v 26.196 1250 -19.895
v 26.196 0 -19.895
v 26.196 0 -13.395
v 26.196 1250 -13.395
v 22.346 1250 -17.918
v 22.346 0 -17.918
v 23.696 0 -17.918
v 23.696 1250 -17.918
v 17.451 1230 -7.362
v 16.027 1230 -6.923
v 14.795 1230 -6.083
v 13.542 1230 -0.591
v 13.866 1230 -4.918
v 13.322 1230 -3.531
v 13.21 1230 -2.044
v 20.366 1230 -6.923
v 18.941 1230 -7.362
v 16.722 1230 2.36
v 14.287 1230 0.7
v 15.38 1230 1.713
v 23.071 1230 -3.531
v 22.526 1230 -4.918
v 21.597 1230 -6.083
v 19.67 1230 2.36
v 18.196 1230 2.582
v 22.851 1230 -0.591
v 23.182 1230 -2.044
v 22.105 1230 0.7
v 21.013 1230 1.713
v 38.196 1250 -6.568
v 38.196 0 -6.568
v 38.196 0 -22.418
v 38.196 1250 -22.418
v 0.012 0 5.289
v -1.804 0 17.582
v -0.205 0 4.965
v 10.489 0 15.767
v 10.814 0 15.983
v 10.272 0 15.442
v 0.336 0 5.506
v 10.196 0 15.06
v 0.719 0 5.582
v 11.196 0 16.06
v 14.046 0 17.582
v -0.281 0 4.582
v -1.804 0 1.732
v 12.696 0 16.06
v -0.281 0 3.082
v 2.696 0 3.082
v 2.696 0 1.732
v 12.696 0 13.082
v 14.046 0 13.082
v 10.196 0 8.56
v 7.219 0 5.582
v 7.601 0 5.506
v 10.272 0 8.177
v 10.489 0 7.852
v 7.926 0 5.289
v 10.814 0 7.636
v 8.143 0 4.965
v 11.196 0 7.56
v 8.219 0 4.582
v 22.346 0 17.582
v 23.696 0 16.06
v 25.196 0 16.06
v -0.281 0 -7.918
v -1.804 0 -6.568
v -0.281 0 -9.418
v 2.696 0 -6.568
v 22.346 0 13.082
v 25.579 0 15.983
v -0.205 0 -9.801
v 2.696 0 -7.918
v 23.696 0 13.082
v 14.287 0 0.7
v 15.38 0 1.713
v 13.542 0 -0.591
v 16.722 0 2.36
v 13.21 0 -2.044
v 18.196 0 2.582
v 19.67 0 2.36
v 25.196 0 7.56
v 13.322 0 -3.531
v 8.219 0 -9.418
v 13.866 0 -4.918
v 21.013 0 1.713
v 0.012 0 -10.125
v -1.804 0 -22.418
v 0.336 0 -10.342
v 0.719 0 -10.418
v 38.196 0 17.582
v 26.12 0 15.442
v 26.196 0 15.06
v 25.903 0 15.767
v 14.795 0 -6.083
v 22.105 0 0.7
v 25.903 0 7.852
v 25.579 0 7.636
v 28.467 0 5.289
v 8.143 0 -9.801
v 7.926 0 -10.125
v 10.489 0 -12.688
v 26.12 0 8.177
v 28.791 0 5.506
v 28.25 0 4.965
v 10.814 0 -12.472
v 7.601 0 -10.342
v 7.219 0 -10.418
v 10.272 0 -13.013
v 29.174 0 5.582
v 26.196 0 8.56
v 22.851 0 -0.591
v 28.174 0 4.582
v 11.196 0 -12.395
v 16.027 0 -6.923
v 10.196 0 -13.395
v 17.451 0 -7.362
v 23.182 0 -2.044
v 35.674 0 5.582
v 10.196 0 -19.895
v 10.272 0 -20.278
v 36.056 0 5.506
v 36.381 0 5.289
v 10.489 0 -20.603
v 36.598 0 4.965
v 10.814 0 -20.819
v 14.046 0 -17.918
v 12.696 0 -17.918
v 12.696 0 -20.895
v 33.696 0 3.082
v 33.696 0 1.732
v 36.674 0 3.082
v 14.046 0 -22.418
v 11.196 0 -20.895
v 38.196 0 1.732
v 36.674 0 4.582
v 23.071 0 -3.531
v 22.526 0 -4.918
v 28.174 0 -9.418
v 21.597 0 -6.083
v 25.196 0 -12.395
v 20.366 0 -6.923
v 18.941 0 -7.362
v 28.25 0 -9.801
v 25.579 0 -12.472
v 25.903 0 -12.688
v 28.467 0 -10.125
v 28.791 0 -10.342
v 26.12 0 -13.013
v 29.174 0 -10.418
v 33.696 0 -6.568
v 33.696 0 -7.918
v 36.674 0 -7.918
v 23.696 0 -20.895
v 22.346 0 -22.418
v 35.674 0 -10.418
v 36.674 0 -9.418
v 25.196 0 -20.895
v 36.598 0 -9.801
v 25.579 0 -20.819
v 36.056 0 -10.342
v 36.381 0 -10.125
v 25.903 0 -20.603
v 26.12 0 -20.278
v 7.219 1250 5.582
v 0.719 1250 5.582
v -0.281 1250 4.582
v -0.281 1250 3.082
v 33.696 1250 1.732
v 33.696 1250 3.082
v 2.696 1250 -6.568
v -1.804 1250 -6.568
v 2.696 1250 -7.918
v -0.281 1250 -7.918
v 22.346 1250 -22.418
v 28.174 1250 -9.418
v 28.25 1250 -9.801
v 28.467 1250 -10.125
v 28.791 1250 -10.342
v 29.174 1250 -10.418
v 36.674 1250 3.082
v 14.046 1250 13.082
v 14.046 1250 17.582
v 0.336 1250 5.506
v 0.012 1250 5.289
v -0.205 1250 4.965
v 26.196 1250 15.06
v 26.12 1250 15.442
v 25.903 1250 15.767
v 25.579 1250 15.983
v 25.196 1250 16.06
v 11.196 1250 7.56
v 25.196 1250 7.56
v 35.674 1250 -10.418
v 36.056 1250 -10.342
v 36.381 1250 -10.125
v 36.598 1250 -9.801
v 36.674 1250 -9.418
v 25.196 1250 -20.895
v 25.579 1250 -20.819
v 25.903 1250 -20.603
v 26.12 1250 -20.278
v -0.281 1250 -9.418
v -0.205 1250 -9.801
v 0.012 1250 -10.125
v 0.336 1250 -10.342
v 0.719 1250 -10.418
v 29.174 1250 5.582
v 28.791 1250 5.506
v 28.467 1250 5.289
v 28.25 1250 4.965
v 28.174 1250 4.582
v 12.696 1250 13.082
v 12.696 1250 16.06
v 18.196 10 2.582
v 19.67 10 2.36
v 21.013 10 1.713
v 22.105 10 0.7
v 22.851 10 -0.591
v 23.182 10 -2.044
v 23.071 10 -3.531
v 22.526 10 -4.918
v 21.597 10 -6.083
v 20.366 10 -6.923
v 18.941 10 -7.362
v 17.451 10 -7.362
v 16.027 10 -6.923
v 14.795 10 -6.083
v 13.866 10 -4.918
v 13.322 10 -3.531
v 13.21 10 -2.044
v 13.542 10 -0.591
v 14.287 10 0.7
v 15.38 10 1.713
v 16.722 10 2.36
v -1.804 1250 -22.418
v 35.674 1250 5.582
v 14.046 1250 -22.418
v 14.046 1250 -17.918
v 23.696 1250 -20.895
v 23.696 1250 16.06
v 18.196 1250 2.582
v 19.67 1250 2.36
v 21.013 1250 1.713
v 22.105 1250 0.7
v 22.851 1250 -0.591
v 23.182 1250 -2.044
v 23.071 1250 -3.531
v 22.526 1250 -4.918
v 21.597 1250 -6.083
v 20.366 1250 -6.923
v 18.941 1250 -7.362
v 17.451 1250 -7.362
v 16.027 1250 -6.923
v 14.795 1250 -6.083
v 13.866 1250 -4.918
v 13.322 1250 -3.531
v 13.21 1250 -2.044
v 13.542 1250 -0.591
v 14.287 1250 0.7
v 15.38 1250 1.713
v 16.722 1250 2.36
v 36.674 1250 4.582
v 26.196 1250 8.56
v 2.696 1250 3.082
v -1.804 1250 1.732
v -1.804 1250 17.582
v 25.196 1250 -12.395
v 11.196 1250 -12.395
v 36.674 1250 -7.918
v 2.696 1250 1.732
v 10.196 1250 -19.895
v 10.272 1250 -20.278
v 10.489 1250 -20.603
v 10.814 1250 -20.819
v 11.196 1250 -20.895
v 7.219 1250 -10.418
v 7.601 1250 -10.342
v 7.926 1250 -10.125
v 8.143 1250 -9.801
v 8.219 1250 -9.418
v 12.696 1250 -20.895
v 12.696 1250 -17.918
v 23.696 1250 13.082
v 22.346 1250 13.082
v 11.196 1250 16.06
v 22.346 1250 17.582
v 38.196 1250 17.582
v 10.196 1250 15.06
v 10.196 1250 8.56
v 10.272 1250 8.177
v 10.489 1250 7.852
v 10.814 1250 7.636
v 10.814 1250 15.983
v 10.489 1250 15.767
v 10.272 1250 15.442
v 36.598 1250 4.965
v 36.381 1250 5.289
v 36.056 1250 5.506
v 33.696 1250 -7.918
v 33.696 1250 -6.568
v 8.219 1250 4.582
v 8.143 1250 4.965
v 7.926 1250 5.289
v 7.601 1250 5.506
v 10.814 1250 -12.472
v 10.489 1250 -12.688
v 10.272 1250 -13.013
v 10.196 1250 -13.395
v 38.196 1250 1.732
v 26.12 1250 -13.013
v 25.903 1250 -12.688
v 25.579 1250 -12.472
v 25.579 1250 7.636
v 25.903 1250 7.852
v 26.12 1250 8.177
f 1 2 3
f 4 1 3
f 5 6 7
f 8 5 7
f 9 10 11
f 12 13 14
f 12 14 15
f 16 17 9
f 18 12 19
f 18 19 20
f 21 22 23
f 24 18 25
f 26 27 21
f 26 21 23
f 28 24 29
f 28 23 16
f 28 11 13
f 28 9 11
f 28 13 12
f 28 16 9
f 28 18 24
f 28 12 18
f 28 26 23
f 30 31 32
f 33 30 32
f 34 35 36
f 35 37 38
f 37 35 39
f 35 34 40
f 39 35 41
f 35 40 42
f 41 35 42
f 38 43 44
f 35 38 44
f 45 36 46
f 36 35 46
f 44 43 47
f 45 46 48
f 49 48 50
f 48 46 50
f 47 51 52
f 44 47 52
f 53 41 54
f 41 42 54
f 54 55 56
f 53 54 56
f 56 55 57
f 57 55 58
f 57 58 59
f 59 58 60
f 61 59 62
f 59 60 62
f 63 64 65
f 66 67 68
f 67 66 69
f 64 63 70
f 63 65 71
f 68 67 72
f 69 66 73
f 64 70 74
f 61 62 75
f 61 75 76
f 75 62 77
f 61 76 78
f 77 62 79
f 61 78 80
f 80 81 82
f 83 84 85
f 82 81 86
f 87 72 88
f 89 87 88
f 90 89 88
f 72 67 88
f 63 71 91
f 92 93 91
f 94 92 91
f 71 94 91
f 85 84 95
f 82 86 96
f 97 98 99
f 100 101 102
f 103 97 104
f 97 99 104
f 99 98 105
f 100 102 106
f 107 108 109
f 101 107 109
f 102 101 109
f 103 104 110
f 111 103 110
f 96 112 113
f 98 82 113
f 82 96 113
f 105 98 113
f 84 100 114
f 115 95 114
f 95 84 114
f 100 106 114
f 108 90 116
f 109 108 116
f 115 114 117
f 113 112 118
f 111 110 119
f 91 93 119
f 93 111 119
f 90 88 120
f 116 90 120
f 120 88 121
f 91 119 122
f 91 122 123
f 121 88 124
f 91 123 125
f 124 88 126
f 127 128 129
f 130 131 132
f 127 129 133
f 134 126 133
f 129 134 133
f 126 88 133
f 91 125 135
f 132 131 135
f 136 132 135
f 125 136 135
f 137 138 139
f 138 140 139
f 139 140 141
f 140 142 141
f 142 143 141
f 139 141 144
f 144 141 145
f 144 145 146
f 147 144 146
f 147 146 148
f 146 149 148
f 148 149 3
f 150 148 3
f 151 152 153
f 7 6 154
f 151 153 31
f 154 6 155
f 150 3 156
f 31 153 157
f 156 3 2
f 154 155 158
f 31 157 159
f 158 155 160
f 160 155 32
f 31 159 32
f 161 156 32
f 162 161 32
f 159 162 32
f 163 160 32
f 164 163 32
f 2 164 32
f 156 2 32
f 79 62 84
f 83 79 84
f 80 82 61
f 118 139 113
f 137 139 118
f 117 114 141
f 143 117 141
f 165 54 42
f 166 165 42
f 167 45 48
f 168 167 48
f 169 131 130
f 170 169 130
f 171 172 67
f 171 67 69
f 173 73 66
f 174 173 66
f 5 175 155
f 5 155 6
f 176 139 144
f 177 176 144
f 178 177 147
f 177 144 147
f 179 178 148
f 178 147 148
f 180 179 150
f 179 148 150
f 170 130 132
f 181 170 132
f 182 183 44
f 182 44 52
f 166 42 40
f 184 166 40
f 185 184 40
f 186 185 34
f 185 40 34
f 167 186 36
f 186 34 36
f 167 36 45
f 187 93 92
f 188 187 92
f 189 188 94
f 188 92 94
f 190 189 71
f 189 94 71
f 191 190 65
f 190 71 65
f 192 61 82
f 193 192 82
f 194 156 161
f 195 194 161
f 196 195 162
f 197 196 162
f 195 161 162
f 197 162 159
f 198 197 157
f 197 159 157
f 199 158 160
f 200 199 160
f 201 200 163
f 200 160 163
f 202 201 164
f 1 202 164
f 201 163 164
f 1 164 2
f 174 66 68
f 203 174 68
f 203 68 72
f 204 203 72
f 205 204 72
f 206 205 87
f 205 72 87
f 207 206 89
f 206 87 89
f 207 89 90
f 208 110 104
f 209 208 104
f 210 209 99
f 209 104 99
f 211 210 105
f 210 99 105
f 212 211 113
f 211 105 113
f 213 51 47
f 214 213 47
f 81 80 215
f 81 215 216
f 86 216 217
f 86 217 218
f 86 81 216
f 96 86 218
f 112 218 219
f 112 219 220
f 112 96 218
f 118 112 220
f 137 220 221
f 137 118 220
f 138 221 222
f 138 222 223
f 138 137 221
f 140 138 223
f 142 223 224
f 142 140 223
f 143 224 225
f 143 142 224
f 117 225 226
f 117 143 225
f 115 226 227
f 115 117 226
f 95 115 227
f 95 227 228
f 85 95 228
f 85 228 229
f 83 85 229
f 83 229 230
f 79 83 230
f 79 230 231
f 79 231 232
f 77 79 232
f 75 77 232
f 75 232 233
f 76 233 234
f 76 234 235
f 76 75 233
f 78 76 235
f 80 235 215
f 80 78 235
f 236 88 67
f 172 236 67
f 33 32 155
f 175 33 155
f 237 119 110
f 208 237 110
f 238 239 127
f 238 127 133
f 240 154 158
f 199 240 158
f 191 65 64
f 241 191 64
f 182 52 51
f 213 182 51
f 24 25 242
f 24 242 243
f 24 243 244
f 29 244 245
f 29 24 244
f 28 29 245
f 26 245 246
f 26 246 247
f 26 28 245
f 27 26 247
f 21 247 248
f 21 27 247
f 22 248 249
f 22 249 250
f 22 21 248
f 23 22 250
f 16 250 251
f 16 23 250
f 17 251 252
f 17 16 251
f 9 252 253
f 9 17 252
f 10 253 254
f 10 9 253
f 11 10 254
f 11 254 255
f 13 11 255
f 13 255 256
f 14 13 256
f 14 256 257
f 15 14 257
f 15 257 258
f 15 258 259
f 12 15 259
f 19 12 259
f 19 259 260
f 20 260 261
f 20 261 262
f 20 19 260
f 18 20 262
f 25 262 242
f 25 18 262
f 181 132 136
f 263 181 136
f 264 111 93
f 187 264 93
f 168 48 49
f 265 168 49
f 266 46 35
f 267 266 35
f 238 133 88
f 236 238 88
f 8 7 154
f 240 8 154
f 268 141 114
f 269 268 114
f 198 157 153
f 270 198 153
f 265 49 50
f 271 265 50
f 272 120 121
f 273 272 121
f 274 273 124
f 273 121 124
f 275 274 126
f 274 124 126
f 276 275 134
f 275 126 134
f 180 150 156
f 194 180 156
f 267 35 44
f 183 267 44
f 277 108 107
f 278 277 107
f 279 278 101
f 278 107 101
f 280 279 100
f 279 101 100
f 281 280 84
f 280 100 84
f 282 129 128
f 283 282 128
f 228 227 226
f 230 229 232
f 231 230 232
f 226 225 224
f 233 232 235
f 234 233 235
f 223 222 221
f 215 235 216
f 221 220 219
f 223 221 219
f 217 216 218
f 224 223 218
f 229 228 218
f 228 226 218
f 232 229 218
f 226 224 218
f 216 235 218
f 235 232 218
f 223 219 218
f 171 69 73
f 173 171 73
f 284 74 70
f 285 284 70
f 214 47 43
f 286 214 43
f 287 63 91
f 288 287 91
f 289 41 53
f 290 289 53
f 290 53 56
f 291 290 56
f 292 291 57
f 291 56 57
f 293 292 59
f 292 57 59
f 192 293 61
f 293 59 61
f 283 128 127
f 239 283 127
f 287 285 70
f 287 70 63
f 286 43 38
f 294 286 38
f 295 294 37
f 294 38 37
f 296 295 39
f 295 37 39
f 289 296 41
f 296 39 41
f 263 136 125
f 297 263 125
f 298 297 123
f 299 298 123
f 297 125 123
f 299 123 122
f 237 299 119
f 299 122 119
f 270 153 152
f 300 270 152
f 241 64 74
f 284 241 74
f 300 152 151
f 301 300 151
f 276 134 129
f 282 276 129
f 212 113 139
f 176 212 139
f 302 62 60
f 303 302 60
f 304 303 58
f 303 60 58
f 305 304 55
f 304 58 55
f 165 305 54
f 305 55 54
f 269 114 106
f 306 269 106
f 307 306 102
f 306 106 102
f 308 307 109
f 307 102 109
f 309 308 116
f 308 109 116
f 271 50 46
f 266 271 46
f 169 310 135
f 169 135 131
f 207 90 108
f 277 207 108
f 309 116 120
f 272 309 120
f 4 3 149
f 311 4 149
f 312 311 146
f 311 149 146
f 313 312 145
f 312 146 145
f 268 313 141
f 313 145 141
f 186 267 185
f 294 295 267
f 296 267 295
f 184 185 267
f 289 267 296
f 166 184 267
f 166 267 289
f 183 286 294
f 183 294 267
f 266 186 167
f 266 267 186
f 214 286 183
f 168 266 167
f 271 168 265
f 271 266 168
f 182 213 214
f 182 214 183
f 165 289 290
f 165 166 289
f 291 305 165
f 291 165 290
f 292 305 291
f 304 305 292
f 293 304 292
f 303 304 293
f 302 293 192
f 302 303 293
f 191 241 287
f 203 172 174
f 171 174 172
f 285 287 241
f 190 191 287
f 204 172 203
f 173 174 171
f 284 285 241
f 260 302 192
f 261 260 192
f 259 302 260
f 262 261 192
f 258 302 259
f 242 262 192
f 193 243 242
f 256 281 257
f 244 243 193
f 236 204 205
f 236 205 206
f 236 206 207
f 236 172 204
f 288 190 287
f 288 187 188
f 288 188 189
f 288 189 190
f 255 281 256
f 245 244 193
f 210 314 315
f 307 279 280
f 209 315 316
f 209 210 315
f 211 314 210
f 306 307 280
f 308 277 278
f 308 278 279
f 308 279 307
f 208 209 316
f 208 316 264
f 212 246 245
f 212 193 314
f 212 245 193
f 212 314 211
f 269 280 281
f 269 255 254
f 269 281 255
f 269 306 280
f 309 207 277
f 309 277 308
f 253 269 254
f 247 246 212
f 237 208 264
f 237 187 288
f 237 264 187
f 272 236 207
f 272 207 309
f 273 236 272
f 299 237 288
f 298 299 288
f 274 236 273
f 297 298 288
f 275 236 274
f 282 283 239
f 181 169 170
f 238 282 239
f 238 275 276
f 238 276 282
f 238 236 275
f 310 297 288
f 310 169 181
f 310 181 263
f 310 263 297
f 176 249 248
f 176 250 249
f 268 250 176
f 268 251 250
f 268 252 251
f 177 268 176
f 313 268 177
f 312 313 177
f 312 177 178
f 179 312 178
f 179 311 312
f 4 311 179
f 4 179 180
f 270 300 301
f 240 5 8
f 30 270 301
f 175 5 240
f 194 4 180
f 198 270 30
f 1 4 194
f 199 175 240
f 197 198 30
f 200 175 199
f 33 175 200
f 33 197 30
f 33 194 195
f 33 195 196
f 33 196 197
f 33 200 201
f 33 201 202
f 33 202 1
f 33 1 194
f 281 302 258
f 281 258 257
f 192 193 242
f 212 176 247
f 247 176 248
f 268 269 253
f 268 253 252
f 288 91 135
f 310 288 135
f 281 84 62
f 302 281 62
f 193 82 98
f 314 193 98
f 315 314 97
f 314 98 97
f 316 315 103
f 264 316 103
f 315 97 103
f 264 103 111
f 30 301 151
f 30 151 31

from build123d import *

# Parameters (mm, degrees)
RESSALTO_EXTRUS_O1_DEPTH = 1250
ESBO_O2_3_R              = 5
CORTE_EXTRUS_O1_DEPTH    = 10
CORTE_EXTRUS_O2_START    = -20
ESBO_O4_R                = 5
CORTE_EXTRUS_O2_DEPTH    = 20


with BuildPart() as part:
    # Esboço2 → Ressalto-extrusão1 (new body)
    with BuildSketch(Plane(origin=(0, 0, 0), x_dir=(1, 0, 0), z_dir=(0, 1, 0))):
        with BuildLine():
            Line((-1.803730261, 22.417940287), (-1.803730261, 6.567940287))
            Line((-1.803730261, 6.567940287), (2.696269739, 6.567940287))
            Line((2.696269739, 6.567940287), (2.696269739, 7.917940287))
            Line((2.696269739, 7.917940287), (-0.281184469, 7.917940287))
            Line((-0.281184469, 7.917940287), (-0.281184469, 9.417940287))
            ThreePointArc((-0.281184469, 9.417940287), (0.01170875, 10.125047068), (0.718815531, 10.417940287))
            Line((0.718815531, 10.417940287), (7.218815531, 10.417940287))
            ThreePointArc((7.218815531, 10.417940287), (7.925922312, 10.125047068), (8.218815531, 9.417940287))
            Line((8.218815531, 9.417940287), (8.218815531, -4.582059713))
            ThreePointArc((8.218815531, -4.582059713), (7.925922312, -5.289166494), (7.218815531, -5.582059713))
            Line((7.218815531, -5.582059713), (0.718815531, -5.582059713))
            ThreePointArc((0.718815531, -5.582059713), (0.01170875, -5.289166494), (-0.281184469, -4.582059713))
            Line((-0.281184469, -4.582059713), (-0.281184469, -3.082059713))
            Line((-0.281184469, -3.082059713), (2.696269739, -3.082059713))
            Line((2.696269739, -3.082059713), (2.696269739, -1.732059713))
            Line((2.696269739, -1.732059713), (-1.803730261, -1.732059713))
            Line((-1.803730261, -1.732059713), (-1.803730261, -17.582059713))
            Line((-1.803730261, -17.582059713), (14.046269739, -17.582059713))
            Line((14.046269739, -17.582059713), (14.046269739, -13.082059713))
            Line((14.046269739, -13.082059713), (12.696269739, -13.082059713))
            Line((12.696269739, -13.082059713), (12.696269739, -16.059513921))
            Line((12.696269739, -16.059513921), (11.196269739, -16.059513921))
            ThreePointArc((11.196269739, -16.059513921), (10.489162958, -15.766620702), (10.196269739, -15.059513921))
            Line((10.196269739, -15.059513921), (10.196269739, -8.559513921))
            ThreePointArc((10.196269739, -8.559513921), (10.489162958, -7.85240714), (11.196269739, -7.559513921))
            Line((11.196269739, -7.559513921), (25.196269739, -7.559513921))
            ThreePointArc((25.196269739, -7.559513921), (25.90337652, -7.85240714), (26.196269739, -8.559513921))
            Line((26.196269739, -8.559513921), (26.196269739, -15.059513921))
            ThreePointArc((26.196269739, -15.059513921), (25.90337652, -15.766620702), (25.196269739, -16.059513921))
            Line((25.196269739, -16.059513921), (23.696269739, -16.059513921))
            Line((23.696269739, -16.059513921), (23.696269739, -13.082059713))
            Line((23.696269739, -13.082059713), (22.346269739, -13.082059713))
            Line((22.346269739, -13.082059713), (22.346269739, -17.582059713))
            Line((22.346269739, -17.582059713), (38.196269739, -17.582059713))
            Line((38.196269739, -17.582059713), (38.196269739, -1.732059713))
            Line((38.196269739, -1.732059713), (33.696269739, -1.732059713))
            Line((33.696269739, -1.732059713), (33.696269739, -3.082059713))
            Line((33.696269739, -3.082059713), (36.673723947, -3.082059713))
            Line((36.673723947, -3.082059713), (36.673723947, -4.582059713))
            ThreePointArc((36.673723947, -4.582059713), (36.380830728, -5.289166494), (35.673723947, -5.582059713))
            Line((35.673723947, -5.582059713), (29.173723947, -5.582059713))
            ThreePointArc((29.173723947, -5.582059713), (28.466617166, -5.289166494), (28.173723947, -4.582059713))
            Line((28.173723947, -4.582059713), (28.173723947, 9.417940287))
            ThreePointArc((28.173723947, 9.417940287), (28.466617166, 10.125047068), (29.173723947, 10.417940287))
            Line((29.173723947, 10.417940287), (35.673723947, 10.417940287))
            ThreePointArc((35.673723947, 10.417940287), (36.380830728, 10.125047068), (36.673723947, 9.417940287))
            Line((36.673723947, 9.417940287), (36.673723947, 7.917940287))
            Line((36.673723947, 7.917940287), (33.696269739, 7.917940287))
            Line((33.696269739, 7.917940287), (33.696269739, 6.567940287))
            Line((33.696269739, 6.567940287), (38.196269739, 6.567940287))
            Line((38.196269739, 6.567940287), (38.196269739, 22.417940287))
            Line((38.196269739, 22.417940287), (22.346269739, 22.417940287))
            Line((22.346269739, 22.417940287), (22.346269739, 17.917940287))
            Line((22.346269739, 17.917940287), (23.696269739, 17.917940287))
            Line((23.696269739, 17.917940287), (23.696269739, 20.895394495))
            Line((23.696269739, 20.895394495), (25.196269739, 20.895394495))
            ThreePointArc((25.196269739, 20.895394495), (25.90337652, 20.602501277), (26.196269739, 19.895394495))
            Line((26.196269739, 19.895394495), (26.196269739, 13.395394495))
            ThreePointArc((26.196269739, 13.395394495), (25.90337652, 12.688287714), (25.196269739, 12.395394495))
            Line((25.196269739, 12.395394495), (11.196269739, 12.395394495))
            ThreePointArc((11.196269739, 12.395394495), (10.489162958, 12.688287714), (10.196269739, 13.395394495))
            Line((10.196269739, 13.395394495), (10.196269739, 19.895394495))
            ThreePointArc((10.196269739, 19.895394495), (10.489162958, 20.602501277), (11.196269739, 20.895394495))
            Line((11.196269739, 20.895394495), (12.696269739, 20.895394495))
            Line((12.696269739, 20.895394495), (12.696269739, 17.917940287))
            Line((12.696269739, 17.917940287), (14.046269739, 17.917940287))
            Line((14.046269739, 17.917940287), (14.046269739, 22.417940287))
            Line((14.046269739, 22.417940287), (-1.803730261, 22.417940287))
        make_face()
    extrude(amount=RESSALTO_EXTRUS_O1_DEPTH)

    # Esboço2<3> → Corte-extrusão1 (cut)
    with BuildSketch(Plane(origin=(0, 0, 0), x_dir=(1, 0, 0), z_dir=(0, 1, 0))):
        with Locations((18.196269739, 2.417940287)):
            Circle(ESBO_O2_3_R)
    extrude(amount=CORTE_EXTRUS_O1_DEPTH, mode=Mode.SUBTRACT)

    # Esboço4 → Corte-extrusão2 (cut)
    with BuildSketch(Plane(origin=(0, 1250, 0), x_dir=(1, 0, 0), z_dir=(0, 1, 0)).offset(CORTE_EXTRUS_O2_START)):
        with Locations((18.196269739, 2.417940287)):
            Circle(ESBO_O4_R)
    extrude(amount=CORTE_EXTRUS_O2_DEPTH, mode=Mode.SUBTRACT)


solid = part.part
